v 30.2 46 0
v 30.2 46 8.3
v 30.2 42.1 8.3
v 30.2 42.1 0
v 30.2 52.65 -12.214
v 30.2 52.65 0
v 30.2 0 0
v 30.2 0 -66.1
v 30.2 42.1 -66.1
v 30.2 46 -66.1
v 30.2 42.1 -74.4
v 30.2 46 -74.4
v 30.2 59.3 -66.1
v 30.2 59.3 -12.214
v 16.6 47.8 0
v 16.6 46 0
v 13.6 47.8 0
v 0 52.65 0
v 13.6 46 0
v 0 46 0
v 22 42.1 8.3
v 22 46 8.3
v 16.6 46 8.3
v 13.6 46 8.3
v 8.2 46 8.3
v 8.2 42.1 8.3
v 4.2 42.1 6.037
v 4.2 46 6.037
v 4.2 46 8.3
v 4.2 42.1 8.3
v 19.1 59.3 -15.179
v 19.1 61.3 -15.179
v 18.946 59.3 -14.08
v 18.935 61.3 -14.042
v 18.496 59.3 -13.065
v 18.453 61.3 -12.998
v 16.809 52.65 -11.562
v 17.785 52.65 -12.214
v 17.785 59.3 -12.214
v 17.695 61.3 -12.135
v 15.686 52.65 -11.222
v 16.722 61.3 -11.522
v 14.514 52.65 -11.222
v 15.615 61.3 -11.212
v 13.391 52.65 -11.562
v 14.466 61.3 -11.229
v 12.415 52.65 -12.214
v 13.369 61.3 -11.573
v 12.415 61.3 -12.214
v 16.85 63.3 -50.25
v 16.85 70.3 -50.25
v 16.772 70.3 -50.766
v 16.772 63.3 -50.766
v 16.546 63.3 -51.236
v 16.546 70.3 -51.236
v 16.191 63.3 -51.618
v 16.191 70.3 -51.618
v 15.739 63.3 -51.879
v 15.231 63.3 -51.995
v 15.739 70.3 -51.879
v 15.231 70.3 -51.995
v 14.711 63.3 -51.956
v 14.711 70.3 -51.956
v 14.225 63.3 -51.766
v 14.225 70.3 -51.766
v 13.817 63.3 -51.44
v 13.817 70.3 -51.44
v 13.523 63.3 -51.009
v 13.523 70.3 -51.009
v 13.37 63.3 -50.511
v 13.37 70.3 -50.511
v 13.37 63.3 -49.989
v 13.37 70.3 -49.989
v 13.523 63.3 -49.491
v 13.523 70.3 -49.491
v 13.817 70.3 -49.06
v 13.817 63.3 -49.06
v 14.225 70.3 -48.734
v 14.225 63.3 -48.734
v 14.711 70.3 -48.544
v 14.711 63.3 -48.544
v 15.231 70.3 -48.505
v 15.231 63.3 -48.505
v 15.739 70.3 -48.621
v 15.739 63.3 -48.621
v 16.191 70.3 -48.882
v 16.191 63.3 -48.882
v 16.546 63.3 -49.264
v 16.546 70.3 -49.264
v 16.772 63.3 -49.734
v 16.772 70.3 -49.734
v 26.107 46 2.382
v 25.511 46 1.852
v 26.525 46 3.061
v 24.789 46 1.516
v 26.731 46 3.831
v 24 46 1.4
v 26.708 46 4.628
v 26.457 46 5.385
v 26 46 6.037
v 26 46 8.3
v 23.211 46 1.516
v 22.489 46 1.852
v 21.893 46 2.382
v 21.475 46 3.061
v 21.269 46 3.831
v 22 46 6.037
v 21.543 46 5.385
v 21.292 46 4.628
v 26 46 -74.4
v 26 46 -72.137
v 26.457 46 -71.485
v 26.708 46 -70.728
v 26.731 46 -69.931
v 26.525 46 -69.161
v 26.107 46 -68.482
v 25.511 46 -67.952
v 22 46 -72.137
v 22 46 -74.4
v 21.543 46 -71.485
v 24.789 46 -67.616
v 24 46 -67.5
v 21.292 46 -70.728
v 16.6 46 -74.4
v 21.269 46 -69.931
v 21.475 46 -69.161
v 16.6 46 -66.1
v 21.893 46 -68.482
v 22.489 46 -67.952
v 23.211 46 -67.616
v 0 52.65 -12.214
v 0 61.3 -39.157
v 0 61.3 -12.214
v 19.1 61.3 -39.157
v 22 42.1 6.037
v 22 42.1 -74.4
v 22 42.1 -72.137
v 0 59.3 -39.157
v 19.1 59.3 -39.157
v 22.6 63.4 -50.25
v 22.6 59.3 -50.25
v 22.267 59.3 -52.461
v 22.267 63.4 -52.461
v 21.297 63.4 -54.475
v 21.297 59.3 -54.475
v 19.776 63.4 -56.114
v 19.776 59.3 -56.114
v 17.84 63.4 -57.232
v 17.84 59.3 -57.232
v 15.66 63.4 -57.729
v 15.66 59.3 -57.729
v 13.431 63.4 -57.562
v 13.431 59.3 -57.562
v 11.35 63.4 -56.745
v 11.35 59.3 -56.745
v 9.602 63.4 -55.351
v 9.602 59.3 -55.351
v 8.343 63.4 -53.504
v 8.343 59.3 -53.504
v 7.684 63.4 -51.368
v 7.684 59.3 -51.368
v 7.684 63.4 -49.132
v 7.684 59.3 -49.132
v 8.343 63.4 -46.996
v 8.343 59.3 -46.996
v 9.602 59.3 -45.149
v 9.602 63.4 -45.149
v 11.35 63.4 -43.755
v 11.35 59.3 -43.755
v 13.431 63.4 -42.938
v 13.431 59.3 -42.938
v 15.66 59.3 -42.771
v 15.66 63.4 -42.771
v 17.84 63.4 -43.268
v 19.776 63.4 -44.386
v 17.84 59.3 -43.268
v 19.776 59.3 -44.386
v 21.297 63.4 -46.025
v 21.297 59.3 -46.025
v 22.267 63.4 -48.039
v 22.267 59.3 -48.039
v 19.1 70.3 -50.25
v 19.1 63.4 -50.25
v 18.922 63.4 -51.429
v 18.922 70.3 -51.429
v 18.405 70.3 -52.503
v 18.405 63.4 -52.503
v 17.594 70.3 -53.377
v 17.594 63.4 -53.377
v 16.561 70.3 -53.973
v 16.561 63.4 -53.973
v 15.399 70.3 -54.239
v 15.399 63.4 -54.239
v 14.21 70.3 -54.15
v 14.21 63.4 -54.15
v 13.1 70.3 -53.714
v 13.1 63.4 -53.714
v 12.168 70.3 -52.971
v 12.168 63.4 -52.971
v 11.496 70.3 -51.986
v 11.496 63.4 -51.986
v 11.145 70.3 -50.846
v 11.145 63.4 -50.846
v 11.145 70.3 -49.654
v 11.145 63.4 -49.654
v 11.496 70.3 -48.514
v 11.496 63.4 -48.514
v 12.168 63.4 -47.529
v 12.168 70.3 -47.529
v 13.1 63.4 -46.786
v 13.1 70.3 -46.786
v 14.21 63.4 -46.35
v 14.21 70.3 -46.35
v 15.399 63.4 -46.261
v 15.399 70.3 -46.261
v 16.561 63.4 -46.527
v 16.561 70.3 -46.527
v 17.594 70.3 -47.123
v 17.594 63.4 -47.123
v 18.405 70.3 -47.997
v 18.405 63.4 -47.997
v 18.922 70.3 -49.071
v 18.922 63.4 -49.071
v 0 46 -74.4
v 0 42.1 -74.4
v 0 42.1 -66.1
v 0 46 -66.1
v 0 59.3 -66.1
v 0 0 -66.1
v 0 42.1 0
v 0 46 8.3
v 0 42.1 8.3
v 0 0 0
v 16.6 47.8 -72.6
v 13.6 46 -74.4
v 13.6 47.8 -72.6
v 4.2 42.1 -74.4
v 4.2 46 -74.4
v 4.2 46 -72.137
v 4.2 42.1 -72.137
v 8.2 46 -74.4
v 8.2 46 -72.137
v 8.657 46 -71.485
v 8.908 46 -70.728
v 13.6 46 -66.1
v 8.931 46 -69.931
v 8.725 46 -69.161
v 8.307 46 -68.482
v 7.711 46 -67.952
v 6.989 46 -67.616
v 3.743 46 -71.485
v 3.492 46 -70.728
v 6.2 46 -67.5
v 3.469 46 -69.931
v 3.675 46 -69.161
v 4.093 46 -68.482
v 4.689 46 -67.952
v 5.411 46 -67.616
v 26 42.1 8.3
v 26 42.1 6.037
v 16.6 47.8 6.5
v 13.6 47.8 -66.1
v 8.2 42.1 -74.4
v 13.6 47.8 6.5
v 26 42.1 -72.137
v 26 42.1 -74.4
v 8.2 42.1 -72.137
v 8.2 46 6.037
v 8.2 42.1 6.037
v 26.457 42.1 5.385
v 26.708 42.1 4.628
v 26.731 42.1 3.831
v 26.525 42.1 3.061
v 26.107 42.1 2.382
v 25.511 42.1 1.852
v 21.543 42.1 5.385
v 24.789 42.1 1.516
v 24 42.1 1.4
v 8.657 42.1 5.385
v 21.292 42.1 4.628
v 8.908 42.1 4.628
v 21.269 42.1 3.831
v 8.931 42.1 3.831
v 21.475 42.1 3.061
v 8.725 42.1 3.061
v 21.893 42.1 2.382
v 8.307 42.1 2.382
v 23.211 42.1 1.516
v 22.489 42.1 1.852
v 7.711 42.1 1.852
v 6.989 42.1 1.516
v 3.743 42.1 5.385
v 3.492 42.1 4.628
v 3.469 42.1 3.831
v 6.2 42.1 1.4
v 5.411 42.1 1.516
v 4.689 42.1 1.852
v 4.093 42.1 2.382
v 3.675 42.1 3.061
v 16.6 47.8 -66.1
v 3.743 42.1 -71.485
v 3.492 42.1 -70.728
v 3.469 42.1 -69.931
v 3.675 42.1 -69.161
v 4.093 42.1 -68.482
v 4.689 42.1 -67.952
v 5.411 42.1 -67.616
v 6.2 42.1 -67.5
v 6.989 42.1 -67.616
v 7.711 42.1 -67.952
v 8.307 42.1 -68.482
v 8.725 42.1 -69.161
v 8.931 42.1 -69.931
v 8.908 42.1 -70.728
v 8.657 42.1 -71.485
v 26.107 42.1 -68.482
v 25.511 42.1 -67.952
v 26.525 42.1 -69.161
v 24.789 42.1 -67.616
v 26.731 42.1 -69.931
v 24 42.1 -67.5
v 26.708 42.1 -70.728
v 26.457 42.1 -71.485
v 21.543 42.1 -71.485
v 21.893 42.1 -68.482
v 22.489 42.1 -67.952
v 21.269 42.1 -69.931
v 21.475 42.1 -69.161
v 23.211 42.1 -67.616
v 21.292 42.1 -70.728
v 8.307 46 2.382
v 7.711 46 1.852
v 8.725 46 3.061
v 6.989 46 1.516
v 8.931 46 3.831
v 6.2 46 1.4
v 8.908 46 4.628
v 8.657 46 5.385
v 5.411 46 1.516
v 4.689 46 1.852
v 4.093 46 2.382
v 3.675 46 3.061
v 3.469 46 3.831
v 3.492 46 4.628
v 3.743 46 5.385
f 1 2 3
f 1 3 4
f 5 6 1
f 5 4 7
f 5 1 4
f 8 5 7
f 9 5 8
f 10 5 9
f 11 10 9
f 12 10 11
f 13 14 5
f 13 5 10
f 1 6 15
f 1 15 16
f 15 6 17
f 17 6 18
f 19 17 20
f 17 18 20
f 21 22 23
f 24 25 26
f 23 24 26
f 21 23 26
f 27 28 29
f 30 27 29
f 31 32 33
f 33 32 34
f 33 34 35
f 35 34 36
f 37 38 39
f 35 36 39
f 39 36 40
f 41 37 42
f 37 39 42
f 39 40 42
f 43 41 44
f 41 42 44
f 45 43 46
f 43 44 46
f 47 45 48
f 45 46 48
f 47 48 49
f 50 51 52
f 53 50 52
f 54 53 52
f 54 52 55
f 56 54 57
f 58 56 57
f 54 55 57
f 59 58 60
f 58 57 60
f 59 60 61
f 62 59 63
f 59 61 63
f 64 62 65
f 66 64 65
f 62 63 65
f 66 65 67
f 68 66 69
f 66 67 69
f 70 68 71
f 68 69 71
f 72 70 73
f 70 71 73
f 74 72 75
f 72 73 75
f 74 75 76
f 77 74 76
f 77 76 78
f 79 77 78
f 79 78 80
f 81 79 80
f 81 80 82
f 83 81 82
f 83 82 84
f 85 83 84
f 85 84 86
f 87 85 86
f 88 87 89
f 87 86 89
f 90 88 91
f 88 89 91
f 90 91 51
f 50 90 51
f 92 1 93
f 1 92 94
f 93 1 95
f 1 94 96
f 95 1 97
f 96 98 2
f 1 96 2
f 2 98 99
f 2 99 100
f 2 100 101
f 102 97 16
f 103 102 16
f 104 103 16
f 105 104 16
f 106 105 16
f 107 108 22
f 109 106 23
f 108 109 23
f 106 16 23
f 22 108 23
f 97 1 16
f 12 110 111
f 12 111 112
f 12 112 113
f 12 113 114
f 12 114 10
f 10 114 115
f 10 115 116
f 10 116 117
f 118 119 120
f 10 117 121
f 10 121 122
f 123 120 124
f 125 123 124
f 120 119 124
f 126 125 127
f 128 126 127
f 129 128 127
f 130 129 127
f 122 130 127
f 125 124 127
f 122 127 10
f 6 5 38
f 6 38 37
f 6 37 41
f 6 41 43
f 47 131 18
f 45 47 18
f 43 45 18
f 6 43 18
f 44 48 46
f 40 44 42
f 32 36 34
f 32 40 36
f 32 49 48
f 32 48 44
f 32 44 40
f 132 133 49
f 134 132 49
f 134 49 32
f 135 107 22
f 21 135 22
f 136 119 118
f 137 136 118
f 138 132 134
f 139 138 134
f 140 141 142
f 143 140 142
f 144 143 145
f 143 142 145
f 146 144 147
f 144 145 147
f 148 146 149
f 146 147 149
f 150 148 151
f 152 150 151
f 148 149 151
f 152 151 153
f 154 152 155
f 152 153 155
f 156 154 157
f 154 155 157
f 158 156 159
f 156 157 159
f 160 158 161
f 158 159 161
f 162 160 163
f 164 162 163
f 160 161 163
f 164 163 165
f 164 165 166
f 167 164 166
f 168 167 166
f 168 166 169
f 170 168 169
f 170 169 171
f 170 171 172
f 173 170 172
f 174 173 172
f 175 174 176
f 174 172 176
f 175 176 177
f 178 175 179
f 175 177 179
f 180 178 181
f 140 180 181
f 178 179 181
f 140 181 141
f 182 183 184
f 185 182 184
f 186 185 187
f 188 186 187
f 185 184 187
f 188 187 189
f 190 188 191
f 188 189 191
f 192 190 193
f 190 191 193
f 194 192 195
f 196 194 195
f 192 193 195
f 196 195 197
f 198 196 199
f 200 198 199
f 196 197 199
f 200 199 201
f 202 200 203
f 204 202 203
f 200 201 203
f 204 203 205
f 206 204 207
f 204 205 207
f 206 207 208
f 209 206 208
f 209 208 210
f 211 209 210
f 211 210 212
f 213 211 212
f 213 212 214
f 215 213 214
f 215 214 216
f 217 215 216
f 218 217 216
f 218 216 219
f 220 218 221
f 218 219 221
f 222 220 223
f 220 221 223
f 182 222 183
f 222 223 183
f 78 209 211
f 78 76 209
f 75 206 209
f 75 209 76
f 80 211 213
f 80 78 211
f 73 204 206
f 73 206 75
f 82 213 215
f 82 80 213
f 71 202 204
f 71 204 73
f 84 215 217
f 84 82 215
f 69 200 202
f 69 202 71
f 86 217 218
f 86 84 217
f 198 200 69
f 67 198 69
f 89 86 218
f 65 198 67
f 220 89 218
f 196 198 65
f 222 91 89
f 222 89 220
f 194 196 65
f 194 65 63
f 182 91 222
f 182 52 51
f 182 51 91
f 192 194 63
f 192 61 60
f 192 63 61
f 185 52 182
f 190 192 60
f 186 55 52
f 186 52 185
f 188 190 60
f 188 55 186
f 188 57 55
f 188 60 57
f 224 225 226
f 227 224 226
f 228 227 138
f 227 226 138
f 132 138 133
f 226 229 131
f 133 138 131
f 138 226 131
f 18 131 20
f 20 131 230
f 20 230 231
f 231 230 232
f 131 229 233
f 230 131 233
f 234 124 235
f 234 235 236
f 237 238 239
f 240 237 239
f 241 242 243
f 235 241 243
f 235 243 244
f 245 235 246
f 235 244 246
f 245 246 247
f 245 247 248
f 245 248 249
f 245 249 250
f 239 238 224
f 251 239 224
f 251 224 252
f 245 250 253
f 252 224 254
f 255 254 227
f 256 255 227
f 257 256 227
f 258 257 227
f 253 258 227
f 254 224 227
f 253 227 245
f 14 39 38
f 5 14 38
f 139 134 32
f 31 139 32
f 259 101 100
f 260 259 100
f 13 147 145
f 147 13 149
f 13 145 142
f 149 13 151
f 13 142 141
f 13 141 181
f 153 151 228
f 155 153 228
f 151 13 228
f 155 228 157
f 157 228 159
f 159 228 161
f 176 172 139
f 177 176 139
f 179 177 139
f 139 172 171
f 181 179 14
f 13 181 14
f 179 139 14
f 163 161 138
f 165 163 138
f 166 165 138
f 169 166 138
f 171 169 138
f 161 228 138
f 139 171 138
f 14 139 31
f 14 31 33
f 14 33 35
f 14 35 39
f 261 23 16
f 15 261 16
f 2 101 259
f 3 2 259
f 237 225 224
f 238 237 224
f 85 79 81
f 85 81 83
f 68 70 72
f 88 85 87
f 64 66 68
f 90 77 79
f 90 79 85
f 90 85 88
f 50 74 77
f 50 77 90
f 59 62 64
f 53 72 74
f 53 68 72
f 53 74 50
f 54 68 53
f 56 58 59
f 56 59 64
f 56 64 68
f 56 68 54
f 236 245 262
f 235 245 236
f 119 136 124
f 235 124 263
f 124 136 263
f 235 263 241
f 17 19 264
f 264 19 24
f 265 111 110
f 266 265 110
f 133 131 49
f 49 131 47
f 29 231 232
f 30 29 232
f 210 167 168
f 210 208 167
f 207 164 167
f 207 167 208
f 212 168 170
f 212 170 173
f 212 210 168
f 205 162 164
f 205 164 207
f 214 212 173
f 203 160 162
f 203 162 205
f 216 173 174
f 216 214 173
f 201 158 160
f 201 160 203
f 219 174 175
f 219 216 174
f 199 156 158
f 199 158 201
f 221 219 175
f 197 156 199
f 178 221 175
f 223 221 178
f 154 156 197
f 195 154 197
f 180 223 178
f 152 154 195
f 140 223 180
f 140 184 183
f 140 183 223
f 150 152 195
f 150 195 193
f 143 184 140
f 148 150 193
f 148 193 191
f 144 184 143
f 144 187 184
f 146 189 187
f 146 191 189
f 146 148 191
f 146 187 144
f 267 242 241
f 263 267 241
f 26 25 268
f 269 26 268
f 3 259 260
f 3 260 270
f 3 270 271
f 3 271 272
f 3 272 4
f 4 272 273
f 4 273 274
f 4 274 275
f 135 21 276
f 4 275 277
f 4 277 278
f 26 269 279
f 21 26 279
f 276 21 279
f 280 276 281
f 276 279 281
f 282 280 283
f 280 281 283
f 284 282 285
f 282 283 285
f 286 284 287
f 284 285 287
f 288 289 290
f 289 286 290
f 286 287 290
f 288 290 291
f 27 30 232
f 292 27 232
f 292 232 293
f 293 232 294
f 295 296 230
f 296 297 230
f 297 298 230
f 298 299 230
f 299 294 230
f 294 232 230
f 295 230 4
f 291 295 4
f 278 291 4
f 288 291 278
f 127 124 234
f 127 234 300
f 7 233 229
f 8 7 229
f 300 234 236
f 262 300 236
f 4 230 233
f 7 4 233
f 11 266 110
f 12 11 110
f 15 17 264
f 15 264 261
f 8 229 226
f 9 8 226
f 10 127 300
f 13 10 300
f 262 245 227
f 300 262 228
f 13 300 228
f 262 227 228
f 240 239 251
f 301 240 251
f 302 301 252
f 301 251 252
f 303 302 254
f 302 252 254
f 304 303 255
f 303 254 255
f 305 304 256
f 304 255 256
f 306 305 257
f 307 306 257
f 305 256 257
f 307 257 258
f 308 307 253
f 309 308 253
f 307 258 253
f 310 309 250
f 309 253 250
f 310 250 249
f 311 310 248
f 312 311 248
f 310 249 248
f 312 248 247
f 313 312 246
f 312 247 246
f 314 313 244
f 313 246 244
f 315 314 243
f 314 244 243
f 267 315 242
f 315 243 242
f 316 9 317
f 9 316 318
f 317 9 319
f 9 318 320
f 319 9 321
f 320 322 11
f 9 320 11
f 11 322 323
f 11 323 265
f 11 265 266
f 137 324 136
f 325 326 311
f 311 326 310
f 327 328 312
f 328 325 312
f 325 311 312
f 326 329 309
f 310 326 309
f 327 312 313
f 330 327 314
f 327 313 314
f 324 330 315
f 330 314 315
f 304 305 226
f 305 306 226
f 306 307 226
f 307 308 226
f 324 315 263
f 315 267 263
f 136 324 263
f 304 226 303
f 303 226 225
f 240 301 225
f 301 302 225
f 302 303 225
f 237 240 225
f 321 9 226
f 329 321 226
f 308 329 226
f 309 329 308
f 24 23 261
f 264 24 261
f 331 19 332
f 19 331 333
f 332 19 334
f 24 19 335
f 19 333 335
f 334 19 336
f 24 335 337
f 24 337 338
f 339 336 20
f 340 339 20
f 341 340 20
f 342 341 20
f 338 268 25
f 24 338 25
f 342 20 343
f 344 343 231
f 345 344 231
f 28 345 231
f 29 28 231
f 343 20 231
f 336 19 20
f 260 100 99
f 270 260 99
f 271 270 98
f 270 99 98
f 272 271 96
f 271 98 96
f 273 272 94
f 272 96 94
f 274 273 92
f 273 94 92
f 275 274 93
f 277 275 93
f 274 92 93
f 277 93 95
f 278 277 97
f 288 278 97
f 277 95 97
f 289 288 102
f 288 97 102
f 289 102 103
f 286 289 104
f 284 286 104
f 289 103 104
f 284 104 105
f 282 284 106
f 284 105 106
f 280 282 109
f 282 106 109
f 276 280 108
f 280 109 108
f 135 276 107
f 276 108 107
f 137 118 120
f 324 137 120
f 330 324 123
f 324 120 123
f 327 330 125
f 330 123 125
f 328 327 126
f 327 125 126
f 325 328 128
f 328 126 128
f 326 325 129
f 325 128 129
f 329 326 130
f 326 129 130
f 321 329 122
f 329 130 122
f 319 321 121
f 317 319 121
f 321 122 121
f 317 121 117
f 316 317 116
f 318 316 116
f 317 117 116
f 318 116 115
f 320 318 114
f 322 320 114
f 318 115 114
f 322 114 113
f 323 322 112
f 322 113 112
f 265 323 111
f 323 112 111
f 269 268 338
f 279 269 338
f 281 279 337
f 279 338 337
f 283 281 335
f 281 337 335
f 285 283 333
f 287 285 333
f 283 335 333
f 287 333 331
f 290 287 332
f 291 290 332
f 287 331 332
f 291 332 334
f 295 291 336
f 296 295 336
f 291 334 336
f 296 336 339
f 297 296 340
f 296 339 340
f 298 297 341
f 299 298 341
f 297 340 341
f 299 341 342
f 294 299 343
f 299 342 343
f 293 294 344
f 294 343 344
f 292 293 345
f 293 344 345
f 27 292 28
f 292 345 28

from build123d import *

# Parameters (mm, degrees)
BOSS_EXTRUDE1_DEPTH  = 30.2
CUT_EXTRUDE3_DEPTH   = 6.9
SKETCH10_R           = 7.5
BOSS_EXTRUDE6_DEPTH  = 4.1
SKETCH11_R           = 4
BOSS_EXTRUDE7_DEPTH  = 6.9
BOSS_EXTRUDE8_DEPTH  = 8.9
BOSS_EXTRUDE9_DEPTH  = 2
BOSS_EXTRUDE10_DEPTH = 1.8
CUT_EXTRUDE5_DEPTH   = 4
SKETCH23_R           = 1.75
CUT_EXTRUDE6_DEPTH   = 7


with BuildPart() as part:
    # Sketch1 → Boss-Extrude1 (new body)
    with BuildSketch(Plane(origin=(0, 0, 0), x_dir=(0, 0, -1), z_dir=(1, 0, 0))):
        Polygon((0, 0), (66.1, 0), (66.1, 42.1), (74.4, 42.1), (74.4, 46), (66.1, 46), (66.1, 59.3), (12.213560369, 59.3), (12.213560369, 52.65), (0, 52.65), (0, 46), (-8.3, 46), (-8.3, 42.1), (0, 42.1), align=None)
    extrude(amount=BOSS_EXTRUDE1_DEPTH)

    # Sketch9 → Cut-Extrude3 (cut)
    with BuildSketch(Plane(origin=(0, 46, 0), x_dir=(1, 0, 0), z_dir=(0, 1, 0))):
        with BuildLine():
            Line((22, 74.4), (22, 72.137458609))
            ThreePointArc((22, 72.137458609), (24, 67.5), (26, 72.137458609))
            Line((26, 72.137458609), (26, 74.4))
            Line((26, 74.4), (24, 74.4))
            Line((24, 74.4), (22, 74.4))
        make_face()
        with BuildLine():
            Line((6.2, 74.4), (4.2, 74.4))
            Line((4.2, 74.4), (4.2, 72.137458609))
            ThreePointArc((4.2, 72.137458609), (6.2, 67.5), (8.2, 72.137458609))
            Line((8.2, 72.137458609), (8.2, 74.4))
            Line((8.2, 74.4), (6.2, 74.4))
        make_face()
        with BuildLine():
            Line((24, -8.3), (26, -8.3))
            Line((26, -8.3), (26, -6.037458609))
            ThreePointArc((26, -6.037458609), (24, -1.4), (22, -6.037458609))
            Line((22, -6.037458609), (22, -8.3))
            Line((22, -8.3), (24, -8.3))
        make_face()
        with BuildLine():
            Line((8.2, -8.3), (8.2, -6.037458609))
            ThreePointArc((8.2, -6.037458609), (6.2, -1.4), (4.2, -6.037458609))
            Line((4.2, -6.037458609), (4.2, -8.3))
            Line((4.2, -8.3), (6.2, -8.3))
            Line((6.2, -8.3), (8.2, -8.3))
        make_face()
    extrude(amount=-CUT_EXTRUDE3_DEPTH, mode=Mode.SUBTRACT)

    # Sketch10 → Boss-Extrude6 (add)
    with BuildSketch(Plane(origin=(0, 59.3, 0), x_dir=(1, 0, 0), z_dir=(0, 1, 0))):
        with Locations((15.1, 50.25)):
            Circle(SKETCH10_R)
    extrude(amount=BOSS_EXTRUDE6_DEPTH)

    # Sketch11 → Boss-Extrude7 (add)
    with BuildSketch(Plane(origin=(0, 63.4, 0), x_dir=(1, 0, 0), z_dir=(0, 1, 0))):
        with Locations((15.1, 50.25)):
            Circle(SKETCH11_R)
    extrude(amount=BOSS_EXTRUDE7_DEPTH)

    # Sketch14 → Boss-Extrude8 (add)
    with BuildSketch(Plane(origin=(0, 61.3, 0), x_dir=(1, 0, 0), z_dir=(0, 1, 0))):
        with BuildLine():
            Line((0, 39.156780185), (15.1, 39.156780185))
            Line((15.1, 39.156780185), (19.1, 39.156780185))
            Line((19.1, 39.156780185), (19.1, 15.178872415))
            ThreePointArc((19.1, 15.178872415), (15.1, 11.178872415), (11.1, 15.178872415))
            Line((11.1, 15.178872415), (0, 15.178872415))
            Line((0, 15.178872415), (0, 39.156780185))
        make_face()
    extrude(amount=-BOSS_EXTRUDE8_DEPTH)

    # Sketch17 → Boss-Extrude9 (add)
    with BuildSketch(Plane(origin=(0, 59.3, 0), x_dir=(1, 0, 0), z_dir=(0, 1, 0))):
        Polygon((0, 12.213560369), (15.153721143, 12.213560369), (15.1, 15.178872415), (0, 15.178872415), align=None)
    extrude(amount=BOSS_EXTRUDE9_DEPTH)

    # Sketch18 → Boss-Extrude10 (add)
    with BuildSketch(Plane(origin=(0, 46, 0), x_dir=(1, 0, 0), z_dir=(0, 1, 0))):
        Polygon((15.1, 74.4), (16.6, 74.4), (16.6, 66.1), (13.6, 66.1), (13.6, 74.4), align=None)
        Polygon((13.6, -8.3), (15.1, -8.3), (16.6, -8.3), (16.6, 0), (13.6, 0), align=None)
    extrude(amount=BOSS_EXTRUDE10_DEPTH)

    # Sketch22 → Cut-Extrude5 (cut)
    with BuildSketch(Plane(origin=(16.6, 0, 0), x_dir=(0, 0, -1), z_dir=(1, 0, 0))):
        Polygon((74.4, 46), (72.6, 47.8), (74.4, 47.8), align=None)
        Polygon((-8.3, 47.8), (-8.3, 46), (-6.5, 47.8), align=None)
    extrude(amount=-CUT_EXTRUDE5_DEPTH, mode=Mode.SUBTRACT)

    # Sketch23 → Cut-Extrude6 (cut)
    with BuildSketch(Plane(origin=(0, 70.3, 0), x_dir=(1, 0, 0), z_dir=(0, 1, 0))):
        with Locations((15.1, 50.25)):
            Circle(SKETCH23_R)
    extrude(amount=-CUT_EXTRUDE6_DEPTH, mode=Mode.SUBTRACT)


solid = part.part
